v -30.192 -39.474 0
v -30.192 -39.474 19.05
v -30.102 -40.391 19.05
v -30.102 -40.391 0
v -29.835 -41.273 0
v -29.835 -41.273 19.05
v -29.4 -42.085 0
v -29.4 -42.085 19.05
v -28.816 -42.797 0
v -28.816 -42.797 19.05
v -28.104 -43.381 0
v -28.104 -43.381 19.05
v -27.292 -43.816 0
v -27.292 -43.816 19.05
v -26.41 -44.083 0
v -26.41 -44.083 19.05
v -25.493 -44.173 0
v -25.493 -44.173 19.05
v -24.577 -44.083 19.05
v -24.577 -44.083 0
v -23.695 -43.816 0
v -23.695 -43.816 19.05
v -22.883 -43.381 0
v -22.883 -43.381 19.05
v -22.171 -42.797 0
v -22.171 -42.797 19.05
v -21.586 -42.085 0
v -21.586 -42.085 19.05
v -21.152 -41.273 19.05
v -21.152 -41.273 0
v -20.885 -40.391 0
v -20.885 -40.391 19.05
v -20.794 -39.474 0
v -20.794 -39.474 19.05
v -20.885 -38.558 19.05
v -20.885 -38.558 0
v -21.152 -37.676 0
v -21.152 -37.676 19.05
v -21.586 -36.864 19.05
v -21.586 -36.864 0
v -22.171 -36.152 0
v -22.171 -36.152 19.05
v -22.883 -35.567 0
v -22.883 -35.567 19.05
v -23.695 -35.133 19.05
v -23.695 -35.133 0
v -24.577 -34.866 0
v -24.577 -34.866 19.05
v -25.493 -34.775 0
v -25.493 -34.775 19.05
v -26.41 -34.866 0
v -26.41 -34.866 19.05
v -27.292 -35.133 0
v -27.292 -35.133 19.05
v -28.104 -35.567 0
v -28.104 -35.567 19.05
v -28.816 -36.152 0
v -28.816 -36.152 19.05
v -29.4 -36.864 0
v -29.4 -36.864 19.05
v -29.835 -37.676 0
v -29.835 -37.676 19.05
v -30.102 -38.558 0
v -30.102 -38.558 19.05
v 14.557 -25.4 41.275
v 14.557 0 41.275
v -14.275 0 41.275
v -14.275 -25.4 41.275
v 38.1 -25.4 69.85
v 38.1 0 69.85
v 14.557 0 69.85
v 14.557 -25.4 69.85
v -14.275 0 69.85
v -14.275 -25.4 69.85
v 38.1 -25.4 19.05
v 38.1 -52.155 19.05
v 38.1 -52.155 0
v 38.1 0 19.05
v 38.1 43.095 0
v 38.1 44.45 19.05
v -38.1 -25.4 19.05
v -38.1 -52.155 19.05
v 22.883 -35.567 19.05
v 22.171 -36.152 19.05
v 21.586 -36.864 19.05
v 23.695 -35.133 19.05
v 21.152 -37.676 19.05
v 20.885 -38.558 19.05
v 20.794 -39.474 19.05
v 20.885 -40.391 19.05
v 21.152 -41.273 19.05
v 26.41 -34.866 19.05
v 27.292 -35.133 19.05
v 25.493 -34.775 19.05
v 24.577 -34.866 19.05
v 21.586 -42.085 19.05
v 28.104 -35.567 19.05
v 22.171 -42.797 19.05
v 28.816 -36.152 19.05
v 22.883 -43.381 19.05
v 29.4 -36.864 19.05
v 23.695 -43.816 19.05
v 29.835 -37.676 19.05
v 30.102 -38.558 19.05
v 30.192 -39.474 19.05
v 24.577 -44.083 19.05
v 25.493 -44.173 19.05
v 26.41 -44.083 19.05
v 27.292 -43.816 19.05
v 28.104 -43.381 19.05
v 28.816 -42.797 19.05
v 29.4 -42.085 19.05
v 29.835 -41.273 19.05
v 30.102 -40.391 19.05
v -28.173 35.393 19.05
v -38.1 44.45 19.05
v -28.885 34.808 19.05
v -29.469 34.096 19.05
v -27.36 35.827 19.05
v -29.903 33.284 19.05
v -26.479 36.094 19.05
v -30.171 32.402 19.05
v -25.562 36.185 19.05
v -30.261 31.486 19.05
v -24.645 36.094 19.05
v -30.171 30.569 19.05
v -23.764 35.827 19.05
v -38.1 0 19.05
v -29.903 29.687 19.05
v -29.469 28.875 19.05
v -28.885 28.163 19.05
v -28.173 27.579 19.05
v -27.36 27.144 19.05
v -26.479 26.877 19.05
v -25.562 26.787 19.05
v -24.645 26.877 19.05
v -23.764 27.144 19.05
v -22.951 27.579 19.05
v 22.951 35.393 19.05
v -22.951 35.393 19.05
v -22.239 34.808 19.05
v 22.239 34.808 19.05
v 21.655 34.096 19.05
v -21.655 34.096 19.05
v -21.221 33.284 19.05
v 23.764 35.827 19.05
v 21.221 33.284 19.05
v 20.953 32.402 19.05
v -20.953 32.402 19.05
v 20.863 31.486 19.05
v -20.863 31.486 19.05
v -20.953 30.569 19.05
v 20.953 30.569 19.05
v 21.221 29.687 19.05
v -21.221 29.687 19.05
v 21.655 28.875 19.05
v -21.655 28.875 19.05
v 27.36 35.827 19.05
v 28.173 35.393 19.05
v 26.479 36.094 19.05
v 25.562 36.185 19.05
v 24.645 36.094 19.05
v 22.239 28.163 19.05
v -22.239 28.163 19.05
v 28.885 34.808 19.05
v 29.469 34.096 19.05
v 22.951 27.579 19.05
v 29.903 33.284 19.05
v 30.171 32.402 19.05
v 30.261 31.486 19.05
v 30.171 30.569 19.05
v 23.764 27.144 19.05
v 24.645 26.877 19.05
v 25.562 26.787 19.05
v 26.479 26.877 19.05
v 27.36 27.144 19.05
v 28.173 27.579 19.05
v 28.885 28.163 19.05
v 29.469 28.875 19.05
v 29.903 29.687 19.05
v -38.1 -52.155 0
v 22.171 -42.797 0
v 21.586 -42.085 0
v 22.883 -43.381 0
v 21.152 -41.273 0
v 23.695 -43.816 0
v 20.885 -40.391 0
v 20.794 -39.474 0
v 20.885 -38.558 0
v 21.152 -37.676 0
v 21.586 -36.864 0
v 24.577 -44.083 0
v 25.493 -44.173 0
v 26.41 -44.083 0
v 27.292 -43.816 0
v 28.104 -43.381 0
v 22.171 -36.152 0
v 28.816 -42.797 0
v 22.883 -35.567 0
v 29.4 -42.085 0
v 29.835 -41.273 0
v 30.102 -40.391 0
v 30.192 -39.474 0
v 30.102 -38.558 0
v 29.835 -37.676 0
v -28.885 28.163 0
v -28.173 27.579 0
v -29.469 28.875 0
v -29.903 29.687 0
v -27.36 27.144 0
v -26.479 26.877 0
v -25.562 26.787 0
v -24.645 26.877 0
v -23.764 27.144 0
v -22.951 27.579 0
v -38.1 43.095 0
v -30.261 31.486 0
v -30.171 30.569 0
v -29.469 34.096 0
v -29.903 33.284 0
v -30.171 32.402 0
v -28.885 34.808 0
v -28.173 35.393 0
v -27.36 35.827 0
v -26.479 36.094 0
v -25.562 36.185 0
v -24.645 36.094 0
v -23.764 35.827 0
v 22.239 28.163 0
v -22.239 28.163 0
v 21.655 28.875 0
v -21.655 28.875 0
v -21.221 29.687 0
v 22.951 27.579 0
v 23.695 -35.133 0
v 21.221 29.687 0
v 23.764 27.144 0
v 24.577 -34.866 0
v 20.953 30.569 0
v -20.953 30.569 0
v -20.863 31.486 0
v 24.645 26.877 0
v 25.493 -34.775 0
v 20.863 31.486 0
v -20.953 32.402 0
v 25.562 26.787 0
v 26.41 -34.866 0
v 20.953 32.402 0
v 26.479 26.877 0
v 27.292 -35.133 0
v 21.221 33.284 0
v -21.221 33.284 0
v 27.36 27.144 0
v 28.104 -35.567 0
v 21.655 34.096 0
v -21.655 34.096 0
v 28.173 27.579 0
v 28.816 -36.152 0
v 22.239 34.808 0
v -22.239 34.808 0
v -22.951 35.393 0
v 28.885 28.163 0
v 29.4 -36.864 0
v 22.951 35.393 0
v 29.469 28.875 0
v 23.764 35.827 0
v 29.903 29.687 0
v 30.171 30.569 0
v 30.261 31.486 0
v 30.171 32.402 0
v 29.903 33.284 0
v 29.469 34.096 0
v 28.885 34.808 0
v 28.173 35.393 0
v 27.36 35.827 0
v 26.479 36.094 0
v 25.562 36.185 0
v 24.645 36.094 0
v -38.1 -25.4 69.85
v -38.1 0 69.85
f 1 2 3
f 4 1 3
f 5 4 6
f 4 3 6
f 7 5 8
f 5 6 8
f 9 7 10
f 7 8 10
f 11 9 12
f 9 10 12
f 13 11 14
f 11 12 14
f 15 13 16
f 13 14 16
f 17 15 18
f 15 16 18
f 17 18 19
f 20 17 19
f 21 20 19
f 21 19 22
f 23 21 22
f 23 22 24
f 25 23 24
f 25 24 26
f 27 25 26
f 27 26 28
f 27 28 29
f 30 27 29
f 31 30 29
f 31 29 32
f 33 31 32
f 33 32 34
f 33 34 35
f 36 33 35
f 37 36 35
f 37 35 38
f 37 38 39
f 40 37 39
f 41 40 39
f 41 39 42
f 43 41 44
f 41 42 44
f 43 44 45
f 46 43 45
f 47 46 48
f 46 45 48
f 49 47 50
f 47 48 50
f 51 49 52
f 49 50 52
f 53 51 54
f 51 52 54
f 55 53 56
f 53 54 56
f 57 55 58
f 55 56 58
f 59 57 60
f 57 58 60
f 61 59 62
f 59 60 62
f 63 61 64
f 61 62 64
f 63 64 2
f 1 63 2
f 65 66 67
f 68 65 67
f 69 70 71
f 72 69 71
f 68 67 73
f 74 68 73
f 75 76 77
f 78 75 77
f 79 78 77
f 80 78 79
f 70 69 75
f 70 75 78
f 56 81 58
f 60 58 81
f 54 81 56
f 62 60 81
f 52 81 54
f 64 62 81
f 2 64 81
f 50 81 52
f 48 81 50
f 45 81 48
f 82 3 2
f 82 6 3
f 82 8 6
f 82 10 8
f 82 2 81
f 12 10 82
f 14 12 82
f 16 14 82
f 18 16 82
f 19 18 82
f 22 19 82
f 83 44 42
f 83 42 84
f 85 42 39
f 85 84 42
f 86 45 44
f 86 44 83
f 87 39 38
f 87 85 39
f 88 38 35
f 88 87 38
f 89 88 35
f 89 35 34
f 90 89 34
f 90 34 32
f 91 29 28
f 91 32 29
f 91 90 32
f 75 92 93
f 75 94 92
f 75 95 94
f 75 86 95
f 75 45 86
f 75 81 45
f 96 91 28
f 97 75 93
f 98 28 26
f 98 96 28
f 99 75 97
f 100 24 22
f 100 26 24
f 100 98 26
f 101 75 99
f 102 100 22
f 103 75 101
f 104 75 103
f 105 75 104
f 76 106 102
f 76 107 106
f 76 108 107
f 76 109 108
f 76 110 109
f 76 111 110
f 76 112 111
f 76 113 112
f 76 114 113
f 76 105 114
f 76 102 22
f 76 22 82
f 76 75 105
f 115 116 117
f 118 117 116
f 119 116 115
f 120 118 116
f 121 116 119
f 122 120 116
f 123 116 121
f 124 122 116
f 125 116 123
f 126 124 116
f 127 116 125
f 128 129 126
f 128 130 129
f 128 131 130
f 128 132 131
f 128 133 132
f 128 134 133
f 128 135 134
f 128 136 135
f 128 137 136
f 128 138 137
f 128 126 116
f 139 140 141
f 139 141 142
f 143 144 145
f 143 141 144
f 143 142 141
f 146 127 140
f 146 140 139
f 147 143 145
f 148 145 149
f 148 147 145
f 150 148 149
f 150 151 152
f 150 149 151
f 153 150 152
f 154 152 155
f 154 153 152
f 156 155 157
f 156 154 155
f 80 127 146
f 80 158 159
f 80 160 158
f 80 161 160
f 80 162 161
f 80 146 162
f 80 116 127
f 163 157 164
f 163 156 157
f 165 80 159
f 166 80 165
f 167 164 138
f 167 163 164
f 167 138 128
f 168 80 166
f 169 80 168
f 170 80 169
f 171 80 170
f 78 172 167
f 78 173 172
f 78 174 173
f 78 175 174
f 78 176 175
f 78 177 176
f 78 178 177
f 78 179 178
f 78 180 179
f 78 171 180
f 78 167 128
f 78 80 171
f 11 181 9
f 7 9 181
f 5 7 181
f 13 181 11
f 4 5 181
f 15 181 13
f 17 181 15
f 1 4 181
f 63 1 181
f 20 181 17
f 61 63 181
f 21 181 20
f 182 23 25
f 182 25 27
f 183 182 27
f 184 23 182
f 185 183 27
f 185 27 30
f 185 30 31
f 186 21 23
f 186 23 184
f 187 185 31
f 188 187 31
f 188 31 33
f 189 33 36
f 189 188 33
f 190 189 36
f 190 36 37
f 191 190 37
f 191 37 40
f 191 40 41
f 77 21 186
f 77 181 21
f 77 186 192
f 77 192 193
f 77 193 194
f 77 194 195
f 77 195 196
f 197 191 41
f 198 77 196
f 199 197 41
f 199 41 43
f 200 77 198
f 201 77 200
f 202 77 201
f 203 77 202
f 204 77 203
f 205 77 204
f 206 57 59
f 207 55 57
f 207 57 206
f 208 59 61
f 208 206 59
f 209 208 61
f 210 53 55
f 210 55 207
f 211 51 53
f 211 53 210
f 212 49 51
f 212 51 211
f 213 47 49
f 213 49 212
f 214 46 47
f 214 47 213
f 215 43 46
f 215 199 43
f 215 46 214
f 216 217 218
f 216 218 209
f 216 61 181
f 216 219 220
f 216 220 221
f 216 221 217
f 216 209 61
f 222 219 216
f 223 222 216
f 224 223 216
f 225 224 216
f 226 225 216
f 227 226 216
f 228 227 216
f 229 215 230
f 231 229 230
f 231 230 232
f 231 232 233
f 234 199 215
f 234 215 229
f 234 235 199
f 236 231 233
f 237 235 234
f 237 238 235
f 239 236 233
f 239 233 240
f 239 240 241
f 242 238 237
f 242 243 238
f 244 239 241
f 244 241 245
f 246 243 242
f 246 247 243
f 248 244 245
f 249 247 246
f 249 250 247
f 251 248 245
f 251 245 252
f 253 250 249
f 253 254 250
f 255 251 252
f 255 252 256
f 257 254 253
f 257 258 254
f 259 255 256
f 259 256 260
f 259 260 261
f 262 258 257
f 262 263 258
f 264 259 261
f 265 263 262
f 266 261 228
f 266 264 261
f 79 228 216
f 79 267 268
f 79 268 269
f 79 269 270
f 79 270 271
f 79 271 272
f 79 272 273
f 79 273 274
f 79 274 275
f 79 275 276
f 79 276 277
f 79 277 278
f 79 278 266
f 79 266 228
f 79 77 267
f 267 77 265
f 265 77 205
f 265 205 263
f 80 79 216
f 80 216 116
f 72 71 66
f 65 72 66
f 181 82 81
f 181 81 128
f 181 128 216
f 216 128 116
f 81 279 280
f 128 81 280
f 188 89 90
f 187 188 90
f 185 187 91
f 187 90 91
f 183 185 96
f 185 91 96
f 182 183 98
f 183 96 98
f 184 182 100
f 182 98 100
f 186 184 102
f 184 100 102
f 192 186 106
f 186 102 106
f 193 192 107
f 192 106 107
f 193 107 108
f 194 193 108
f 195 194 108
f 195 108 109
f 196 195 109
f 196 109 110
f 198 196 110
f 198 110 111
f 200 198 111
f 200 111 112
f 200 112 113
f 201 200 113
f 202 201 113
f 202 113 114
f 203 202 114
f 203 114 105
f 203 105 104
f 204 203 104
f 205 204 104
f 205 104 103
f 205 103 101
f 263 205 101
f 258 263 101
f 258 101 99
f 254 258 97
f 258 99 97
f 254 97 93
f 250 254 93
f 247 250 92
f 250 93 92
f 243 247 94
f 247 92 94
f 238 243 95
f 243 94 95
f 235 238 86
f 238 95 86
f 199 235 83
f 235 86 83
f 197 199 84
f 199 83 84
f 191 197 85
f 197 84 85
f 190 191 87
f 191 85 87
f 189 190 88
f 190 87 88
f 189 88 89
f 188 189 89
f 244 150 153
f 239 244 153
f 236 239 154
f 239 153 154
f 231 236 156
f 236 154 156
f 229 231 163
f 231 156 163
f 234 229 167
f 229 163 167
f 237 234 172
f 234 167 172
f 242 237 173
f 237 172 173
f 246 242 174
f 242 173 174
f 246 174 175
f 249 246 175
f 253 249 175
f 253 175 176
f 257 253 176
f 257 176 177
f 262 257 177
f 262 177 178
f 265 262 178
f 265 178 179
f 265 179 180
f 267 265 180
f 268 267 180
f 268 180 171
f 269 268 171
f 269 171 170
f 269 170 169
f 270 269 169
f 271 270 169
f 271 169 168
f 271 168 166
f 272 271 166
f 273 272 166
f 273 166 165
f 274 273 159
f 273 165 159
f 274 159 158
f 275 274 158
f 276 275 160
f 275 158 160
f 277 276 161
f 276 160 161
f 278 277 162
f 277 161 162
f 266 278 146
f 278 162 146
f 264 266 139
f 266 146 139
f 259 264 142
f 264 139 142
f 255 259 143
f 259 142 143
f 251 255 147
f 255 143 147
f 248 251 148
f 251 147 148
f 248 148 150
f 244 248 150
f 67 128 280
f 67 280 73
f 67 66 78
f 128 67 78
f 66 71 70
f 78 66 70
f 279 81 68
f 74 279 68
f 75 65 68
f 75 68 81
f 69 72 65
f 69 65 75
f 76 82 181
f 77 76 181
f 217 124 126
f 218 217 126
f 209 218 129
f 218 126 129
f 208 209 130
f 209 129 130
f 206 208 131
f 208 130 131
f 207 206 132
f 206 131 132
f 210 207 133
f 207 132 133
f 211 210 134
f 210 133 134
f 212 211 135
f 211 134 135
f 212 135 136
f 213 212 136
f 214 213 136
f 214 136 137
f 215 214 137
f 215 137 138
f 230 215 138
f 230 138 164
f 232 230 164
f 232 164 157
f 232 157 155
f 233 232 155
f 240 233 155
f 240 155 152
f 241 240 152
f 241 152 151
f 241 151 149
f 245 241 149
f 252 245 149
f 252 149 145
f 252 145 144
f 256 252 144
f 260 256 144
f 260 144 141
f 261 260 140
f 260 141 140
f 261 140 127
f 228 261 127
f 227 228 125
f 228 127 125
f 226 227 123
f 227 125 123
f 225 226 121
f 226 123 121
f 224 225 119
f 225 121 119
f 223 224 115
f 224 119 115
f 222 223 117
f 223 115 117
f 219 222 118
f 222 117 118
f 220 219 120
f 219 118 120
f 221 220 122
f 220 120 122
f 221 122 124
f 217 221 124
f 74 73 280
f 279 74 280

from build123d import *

# Parameters (mm, degrees)
F1_DEPTH = 25.4
F3_DEPTH = 38.1
F5_D     = 9.398


with BuildPart() as f1:
    # F0 (on Front) → F1 (new body)
    with BuildSketch(Plane.XZ):
        Polygon((-38.1, 0), (38.1, 0), (38.1, 69.85), (14.5568246901, 69.85), (14.5568246901, 41.275), (-14.2748, 41.275), (-14.2748, 69.85), (-38.1, 69.85), align=None)
    extrude(amount=F1_DEPTH)

    # F2 (on Right) → F3 (join, symmetric)
    with BuildSketch(Plane.YZ):
        Polygon((-52.1549474458, 0), (0, 0), (43.0950525542, 0), (44.45, 19.05), (0, 19.05), (-52.1549474458, 19.05), align=None)
    extrude(amount=F3_DEPTH, both=True)

    # F5 (through all)
    with Locations(Plane(origin=(0, 0, 0), x_dir=(1, 0, 0), z_dir=(0, 0, -1))):
        with Locations((-25.4933413446, 39.4742776036), (25.4933413446, 39.4742776036), (25.5620578019, -31.4856089659), (-25.5620578019, -31.4856089659)):
            Hole(F5_D / 2)


solid = f1.part
